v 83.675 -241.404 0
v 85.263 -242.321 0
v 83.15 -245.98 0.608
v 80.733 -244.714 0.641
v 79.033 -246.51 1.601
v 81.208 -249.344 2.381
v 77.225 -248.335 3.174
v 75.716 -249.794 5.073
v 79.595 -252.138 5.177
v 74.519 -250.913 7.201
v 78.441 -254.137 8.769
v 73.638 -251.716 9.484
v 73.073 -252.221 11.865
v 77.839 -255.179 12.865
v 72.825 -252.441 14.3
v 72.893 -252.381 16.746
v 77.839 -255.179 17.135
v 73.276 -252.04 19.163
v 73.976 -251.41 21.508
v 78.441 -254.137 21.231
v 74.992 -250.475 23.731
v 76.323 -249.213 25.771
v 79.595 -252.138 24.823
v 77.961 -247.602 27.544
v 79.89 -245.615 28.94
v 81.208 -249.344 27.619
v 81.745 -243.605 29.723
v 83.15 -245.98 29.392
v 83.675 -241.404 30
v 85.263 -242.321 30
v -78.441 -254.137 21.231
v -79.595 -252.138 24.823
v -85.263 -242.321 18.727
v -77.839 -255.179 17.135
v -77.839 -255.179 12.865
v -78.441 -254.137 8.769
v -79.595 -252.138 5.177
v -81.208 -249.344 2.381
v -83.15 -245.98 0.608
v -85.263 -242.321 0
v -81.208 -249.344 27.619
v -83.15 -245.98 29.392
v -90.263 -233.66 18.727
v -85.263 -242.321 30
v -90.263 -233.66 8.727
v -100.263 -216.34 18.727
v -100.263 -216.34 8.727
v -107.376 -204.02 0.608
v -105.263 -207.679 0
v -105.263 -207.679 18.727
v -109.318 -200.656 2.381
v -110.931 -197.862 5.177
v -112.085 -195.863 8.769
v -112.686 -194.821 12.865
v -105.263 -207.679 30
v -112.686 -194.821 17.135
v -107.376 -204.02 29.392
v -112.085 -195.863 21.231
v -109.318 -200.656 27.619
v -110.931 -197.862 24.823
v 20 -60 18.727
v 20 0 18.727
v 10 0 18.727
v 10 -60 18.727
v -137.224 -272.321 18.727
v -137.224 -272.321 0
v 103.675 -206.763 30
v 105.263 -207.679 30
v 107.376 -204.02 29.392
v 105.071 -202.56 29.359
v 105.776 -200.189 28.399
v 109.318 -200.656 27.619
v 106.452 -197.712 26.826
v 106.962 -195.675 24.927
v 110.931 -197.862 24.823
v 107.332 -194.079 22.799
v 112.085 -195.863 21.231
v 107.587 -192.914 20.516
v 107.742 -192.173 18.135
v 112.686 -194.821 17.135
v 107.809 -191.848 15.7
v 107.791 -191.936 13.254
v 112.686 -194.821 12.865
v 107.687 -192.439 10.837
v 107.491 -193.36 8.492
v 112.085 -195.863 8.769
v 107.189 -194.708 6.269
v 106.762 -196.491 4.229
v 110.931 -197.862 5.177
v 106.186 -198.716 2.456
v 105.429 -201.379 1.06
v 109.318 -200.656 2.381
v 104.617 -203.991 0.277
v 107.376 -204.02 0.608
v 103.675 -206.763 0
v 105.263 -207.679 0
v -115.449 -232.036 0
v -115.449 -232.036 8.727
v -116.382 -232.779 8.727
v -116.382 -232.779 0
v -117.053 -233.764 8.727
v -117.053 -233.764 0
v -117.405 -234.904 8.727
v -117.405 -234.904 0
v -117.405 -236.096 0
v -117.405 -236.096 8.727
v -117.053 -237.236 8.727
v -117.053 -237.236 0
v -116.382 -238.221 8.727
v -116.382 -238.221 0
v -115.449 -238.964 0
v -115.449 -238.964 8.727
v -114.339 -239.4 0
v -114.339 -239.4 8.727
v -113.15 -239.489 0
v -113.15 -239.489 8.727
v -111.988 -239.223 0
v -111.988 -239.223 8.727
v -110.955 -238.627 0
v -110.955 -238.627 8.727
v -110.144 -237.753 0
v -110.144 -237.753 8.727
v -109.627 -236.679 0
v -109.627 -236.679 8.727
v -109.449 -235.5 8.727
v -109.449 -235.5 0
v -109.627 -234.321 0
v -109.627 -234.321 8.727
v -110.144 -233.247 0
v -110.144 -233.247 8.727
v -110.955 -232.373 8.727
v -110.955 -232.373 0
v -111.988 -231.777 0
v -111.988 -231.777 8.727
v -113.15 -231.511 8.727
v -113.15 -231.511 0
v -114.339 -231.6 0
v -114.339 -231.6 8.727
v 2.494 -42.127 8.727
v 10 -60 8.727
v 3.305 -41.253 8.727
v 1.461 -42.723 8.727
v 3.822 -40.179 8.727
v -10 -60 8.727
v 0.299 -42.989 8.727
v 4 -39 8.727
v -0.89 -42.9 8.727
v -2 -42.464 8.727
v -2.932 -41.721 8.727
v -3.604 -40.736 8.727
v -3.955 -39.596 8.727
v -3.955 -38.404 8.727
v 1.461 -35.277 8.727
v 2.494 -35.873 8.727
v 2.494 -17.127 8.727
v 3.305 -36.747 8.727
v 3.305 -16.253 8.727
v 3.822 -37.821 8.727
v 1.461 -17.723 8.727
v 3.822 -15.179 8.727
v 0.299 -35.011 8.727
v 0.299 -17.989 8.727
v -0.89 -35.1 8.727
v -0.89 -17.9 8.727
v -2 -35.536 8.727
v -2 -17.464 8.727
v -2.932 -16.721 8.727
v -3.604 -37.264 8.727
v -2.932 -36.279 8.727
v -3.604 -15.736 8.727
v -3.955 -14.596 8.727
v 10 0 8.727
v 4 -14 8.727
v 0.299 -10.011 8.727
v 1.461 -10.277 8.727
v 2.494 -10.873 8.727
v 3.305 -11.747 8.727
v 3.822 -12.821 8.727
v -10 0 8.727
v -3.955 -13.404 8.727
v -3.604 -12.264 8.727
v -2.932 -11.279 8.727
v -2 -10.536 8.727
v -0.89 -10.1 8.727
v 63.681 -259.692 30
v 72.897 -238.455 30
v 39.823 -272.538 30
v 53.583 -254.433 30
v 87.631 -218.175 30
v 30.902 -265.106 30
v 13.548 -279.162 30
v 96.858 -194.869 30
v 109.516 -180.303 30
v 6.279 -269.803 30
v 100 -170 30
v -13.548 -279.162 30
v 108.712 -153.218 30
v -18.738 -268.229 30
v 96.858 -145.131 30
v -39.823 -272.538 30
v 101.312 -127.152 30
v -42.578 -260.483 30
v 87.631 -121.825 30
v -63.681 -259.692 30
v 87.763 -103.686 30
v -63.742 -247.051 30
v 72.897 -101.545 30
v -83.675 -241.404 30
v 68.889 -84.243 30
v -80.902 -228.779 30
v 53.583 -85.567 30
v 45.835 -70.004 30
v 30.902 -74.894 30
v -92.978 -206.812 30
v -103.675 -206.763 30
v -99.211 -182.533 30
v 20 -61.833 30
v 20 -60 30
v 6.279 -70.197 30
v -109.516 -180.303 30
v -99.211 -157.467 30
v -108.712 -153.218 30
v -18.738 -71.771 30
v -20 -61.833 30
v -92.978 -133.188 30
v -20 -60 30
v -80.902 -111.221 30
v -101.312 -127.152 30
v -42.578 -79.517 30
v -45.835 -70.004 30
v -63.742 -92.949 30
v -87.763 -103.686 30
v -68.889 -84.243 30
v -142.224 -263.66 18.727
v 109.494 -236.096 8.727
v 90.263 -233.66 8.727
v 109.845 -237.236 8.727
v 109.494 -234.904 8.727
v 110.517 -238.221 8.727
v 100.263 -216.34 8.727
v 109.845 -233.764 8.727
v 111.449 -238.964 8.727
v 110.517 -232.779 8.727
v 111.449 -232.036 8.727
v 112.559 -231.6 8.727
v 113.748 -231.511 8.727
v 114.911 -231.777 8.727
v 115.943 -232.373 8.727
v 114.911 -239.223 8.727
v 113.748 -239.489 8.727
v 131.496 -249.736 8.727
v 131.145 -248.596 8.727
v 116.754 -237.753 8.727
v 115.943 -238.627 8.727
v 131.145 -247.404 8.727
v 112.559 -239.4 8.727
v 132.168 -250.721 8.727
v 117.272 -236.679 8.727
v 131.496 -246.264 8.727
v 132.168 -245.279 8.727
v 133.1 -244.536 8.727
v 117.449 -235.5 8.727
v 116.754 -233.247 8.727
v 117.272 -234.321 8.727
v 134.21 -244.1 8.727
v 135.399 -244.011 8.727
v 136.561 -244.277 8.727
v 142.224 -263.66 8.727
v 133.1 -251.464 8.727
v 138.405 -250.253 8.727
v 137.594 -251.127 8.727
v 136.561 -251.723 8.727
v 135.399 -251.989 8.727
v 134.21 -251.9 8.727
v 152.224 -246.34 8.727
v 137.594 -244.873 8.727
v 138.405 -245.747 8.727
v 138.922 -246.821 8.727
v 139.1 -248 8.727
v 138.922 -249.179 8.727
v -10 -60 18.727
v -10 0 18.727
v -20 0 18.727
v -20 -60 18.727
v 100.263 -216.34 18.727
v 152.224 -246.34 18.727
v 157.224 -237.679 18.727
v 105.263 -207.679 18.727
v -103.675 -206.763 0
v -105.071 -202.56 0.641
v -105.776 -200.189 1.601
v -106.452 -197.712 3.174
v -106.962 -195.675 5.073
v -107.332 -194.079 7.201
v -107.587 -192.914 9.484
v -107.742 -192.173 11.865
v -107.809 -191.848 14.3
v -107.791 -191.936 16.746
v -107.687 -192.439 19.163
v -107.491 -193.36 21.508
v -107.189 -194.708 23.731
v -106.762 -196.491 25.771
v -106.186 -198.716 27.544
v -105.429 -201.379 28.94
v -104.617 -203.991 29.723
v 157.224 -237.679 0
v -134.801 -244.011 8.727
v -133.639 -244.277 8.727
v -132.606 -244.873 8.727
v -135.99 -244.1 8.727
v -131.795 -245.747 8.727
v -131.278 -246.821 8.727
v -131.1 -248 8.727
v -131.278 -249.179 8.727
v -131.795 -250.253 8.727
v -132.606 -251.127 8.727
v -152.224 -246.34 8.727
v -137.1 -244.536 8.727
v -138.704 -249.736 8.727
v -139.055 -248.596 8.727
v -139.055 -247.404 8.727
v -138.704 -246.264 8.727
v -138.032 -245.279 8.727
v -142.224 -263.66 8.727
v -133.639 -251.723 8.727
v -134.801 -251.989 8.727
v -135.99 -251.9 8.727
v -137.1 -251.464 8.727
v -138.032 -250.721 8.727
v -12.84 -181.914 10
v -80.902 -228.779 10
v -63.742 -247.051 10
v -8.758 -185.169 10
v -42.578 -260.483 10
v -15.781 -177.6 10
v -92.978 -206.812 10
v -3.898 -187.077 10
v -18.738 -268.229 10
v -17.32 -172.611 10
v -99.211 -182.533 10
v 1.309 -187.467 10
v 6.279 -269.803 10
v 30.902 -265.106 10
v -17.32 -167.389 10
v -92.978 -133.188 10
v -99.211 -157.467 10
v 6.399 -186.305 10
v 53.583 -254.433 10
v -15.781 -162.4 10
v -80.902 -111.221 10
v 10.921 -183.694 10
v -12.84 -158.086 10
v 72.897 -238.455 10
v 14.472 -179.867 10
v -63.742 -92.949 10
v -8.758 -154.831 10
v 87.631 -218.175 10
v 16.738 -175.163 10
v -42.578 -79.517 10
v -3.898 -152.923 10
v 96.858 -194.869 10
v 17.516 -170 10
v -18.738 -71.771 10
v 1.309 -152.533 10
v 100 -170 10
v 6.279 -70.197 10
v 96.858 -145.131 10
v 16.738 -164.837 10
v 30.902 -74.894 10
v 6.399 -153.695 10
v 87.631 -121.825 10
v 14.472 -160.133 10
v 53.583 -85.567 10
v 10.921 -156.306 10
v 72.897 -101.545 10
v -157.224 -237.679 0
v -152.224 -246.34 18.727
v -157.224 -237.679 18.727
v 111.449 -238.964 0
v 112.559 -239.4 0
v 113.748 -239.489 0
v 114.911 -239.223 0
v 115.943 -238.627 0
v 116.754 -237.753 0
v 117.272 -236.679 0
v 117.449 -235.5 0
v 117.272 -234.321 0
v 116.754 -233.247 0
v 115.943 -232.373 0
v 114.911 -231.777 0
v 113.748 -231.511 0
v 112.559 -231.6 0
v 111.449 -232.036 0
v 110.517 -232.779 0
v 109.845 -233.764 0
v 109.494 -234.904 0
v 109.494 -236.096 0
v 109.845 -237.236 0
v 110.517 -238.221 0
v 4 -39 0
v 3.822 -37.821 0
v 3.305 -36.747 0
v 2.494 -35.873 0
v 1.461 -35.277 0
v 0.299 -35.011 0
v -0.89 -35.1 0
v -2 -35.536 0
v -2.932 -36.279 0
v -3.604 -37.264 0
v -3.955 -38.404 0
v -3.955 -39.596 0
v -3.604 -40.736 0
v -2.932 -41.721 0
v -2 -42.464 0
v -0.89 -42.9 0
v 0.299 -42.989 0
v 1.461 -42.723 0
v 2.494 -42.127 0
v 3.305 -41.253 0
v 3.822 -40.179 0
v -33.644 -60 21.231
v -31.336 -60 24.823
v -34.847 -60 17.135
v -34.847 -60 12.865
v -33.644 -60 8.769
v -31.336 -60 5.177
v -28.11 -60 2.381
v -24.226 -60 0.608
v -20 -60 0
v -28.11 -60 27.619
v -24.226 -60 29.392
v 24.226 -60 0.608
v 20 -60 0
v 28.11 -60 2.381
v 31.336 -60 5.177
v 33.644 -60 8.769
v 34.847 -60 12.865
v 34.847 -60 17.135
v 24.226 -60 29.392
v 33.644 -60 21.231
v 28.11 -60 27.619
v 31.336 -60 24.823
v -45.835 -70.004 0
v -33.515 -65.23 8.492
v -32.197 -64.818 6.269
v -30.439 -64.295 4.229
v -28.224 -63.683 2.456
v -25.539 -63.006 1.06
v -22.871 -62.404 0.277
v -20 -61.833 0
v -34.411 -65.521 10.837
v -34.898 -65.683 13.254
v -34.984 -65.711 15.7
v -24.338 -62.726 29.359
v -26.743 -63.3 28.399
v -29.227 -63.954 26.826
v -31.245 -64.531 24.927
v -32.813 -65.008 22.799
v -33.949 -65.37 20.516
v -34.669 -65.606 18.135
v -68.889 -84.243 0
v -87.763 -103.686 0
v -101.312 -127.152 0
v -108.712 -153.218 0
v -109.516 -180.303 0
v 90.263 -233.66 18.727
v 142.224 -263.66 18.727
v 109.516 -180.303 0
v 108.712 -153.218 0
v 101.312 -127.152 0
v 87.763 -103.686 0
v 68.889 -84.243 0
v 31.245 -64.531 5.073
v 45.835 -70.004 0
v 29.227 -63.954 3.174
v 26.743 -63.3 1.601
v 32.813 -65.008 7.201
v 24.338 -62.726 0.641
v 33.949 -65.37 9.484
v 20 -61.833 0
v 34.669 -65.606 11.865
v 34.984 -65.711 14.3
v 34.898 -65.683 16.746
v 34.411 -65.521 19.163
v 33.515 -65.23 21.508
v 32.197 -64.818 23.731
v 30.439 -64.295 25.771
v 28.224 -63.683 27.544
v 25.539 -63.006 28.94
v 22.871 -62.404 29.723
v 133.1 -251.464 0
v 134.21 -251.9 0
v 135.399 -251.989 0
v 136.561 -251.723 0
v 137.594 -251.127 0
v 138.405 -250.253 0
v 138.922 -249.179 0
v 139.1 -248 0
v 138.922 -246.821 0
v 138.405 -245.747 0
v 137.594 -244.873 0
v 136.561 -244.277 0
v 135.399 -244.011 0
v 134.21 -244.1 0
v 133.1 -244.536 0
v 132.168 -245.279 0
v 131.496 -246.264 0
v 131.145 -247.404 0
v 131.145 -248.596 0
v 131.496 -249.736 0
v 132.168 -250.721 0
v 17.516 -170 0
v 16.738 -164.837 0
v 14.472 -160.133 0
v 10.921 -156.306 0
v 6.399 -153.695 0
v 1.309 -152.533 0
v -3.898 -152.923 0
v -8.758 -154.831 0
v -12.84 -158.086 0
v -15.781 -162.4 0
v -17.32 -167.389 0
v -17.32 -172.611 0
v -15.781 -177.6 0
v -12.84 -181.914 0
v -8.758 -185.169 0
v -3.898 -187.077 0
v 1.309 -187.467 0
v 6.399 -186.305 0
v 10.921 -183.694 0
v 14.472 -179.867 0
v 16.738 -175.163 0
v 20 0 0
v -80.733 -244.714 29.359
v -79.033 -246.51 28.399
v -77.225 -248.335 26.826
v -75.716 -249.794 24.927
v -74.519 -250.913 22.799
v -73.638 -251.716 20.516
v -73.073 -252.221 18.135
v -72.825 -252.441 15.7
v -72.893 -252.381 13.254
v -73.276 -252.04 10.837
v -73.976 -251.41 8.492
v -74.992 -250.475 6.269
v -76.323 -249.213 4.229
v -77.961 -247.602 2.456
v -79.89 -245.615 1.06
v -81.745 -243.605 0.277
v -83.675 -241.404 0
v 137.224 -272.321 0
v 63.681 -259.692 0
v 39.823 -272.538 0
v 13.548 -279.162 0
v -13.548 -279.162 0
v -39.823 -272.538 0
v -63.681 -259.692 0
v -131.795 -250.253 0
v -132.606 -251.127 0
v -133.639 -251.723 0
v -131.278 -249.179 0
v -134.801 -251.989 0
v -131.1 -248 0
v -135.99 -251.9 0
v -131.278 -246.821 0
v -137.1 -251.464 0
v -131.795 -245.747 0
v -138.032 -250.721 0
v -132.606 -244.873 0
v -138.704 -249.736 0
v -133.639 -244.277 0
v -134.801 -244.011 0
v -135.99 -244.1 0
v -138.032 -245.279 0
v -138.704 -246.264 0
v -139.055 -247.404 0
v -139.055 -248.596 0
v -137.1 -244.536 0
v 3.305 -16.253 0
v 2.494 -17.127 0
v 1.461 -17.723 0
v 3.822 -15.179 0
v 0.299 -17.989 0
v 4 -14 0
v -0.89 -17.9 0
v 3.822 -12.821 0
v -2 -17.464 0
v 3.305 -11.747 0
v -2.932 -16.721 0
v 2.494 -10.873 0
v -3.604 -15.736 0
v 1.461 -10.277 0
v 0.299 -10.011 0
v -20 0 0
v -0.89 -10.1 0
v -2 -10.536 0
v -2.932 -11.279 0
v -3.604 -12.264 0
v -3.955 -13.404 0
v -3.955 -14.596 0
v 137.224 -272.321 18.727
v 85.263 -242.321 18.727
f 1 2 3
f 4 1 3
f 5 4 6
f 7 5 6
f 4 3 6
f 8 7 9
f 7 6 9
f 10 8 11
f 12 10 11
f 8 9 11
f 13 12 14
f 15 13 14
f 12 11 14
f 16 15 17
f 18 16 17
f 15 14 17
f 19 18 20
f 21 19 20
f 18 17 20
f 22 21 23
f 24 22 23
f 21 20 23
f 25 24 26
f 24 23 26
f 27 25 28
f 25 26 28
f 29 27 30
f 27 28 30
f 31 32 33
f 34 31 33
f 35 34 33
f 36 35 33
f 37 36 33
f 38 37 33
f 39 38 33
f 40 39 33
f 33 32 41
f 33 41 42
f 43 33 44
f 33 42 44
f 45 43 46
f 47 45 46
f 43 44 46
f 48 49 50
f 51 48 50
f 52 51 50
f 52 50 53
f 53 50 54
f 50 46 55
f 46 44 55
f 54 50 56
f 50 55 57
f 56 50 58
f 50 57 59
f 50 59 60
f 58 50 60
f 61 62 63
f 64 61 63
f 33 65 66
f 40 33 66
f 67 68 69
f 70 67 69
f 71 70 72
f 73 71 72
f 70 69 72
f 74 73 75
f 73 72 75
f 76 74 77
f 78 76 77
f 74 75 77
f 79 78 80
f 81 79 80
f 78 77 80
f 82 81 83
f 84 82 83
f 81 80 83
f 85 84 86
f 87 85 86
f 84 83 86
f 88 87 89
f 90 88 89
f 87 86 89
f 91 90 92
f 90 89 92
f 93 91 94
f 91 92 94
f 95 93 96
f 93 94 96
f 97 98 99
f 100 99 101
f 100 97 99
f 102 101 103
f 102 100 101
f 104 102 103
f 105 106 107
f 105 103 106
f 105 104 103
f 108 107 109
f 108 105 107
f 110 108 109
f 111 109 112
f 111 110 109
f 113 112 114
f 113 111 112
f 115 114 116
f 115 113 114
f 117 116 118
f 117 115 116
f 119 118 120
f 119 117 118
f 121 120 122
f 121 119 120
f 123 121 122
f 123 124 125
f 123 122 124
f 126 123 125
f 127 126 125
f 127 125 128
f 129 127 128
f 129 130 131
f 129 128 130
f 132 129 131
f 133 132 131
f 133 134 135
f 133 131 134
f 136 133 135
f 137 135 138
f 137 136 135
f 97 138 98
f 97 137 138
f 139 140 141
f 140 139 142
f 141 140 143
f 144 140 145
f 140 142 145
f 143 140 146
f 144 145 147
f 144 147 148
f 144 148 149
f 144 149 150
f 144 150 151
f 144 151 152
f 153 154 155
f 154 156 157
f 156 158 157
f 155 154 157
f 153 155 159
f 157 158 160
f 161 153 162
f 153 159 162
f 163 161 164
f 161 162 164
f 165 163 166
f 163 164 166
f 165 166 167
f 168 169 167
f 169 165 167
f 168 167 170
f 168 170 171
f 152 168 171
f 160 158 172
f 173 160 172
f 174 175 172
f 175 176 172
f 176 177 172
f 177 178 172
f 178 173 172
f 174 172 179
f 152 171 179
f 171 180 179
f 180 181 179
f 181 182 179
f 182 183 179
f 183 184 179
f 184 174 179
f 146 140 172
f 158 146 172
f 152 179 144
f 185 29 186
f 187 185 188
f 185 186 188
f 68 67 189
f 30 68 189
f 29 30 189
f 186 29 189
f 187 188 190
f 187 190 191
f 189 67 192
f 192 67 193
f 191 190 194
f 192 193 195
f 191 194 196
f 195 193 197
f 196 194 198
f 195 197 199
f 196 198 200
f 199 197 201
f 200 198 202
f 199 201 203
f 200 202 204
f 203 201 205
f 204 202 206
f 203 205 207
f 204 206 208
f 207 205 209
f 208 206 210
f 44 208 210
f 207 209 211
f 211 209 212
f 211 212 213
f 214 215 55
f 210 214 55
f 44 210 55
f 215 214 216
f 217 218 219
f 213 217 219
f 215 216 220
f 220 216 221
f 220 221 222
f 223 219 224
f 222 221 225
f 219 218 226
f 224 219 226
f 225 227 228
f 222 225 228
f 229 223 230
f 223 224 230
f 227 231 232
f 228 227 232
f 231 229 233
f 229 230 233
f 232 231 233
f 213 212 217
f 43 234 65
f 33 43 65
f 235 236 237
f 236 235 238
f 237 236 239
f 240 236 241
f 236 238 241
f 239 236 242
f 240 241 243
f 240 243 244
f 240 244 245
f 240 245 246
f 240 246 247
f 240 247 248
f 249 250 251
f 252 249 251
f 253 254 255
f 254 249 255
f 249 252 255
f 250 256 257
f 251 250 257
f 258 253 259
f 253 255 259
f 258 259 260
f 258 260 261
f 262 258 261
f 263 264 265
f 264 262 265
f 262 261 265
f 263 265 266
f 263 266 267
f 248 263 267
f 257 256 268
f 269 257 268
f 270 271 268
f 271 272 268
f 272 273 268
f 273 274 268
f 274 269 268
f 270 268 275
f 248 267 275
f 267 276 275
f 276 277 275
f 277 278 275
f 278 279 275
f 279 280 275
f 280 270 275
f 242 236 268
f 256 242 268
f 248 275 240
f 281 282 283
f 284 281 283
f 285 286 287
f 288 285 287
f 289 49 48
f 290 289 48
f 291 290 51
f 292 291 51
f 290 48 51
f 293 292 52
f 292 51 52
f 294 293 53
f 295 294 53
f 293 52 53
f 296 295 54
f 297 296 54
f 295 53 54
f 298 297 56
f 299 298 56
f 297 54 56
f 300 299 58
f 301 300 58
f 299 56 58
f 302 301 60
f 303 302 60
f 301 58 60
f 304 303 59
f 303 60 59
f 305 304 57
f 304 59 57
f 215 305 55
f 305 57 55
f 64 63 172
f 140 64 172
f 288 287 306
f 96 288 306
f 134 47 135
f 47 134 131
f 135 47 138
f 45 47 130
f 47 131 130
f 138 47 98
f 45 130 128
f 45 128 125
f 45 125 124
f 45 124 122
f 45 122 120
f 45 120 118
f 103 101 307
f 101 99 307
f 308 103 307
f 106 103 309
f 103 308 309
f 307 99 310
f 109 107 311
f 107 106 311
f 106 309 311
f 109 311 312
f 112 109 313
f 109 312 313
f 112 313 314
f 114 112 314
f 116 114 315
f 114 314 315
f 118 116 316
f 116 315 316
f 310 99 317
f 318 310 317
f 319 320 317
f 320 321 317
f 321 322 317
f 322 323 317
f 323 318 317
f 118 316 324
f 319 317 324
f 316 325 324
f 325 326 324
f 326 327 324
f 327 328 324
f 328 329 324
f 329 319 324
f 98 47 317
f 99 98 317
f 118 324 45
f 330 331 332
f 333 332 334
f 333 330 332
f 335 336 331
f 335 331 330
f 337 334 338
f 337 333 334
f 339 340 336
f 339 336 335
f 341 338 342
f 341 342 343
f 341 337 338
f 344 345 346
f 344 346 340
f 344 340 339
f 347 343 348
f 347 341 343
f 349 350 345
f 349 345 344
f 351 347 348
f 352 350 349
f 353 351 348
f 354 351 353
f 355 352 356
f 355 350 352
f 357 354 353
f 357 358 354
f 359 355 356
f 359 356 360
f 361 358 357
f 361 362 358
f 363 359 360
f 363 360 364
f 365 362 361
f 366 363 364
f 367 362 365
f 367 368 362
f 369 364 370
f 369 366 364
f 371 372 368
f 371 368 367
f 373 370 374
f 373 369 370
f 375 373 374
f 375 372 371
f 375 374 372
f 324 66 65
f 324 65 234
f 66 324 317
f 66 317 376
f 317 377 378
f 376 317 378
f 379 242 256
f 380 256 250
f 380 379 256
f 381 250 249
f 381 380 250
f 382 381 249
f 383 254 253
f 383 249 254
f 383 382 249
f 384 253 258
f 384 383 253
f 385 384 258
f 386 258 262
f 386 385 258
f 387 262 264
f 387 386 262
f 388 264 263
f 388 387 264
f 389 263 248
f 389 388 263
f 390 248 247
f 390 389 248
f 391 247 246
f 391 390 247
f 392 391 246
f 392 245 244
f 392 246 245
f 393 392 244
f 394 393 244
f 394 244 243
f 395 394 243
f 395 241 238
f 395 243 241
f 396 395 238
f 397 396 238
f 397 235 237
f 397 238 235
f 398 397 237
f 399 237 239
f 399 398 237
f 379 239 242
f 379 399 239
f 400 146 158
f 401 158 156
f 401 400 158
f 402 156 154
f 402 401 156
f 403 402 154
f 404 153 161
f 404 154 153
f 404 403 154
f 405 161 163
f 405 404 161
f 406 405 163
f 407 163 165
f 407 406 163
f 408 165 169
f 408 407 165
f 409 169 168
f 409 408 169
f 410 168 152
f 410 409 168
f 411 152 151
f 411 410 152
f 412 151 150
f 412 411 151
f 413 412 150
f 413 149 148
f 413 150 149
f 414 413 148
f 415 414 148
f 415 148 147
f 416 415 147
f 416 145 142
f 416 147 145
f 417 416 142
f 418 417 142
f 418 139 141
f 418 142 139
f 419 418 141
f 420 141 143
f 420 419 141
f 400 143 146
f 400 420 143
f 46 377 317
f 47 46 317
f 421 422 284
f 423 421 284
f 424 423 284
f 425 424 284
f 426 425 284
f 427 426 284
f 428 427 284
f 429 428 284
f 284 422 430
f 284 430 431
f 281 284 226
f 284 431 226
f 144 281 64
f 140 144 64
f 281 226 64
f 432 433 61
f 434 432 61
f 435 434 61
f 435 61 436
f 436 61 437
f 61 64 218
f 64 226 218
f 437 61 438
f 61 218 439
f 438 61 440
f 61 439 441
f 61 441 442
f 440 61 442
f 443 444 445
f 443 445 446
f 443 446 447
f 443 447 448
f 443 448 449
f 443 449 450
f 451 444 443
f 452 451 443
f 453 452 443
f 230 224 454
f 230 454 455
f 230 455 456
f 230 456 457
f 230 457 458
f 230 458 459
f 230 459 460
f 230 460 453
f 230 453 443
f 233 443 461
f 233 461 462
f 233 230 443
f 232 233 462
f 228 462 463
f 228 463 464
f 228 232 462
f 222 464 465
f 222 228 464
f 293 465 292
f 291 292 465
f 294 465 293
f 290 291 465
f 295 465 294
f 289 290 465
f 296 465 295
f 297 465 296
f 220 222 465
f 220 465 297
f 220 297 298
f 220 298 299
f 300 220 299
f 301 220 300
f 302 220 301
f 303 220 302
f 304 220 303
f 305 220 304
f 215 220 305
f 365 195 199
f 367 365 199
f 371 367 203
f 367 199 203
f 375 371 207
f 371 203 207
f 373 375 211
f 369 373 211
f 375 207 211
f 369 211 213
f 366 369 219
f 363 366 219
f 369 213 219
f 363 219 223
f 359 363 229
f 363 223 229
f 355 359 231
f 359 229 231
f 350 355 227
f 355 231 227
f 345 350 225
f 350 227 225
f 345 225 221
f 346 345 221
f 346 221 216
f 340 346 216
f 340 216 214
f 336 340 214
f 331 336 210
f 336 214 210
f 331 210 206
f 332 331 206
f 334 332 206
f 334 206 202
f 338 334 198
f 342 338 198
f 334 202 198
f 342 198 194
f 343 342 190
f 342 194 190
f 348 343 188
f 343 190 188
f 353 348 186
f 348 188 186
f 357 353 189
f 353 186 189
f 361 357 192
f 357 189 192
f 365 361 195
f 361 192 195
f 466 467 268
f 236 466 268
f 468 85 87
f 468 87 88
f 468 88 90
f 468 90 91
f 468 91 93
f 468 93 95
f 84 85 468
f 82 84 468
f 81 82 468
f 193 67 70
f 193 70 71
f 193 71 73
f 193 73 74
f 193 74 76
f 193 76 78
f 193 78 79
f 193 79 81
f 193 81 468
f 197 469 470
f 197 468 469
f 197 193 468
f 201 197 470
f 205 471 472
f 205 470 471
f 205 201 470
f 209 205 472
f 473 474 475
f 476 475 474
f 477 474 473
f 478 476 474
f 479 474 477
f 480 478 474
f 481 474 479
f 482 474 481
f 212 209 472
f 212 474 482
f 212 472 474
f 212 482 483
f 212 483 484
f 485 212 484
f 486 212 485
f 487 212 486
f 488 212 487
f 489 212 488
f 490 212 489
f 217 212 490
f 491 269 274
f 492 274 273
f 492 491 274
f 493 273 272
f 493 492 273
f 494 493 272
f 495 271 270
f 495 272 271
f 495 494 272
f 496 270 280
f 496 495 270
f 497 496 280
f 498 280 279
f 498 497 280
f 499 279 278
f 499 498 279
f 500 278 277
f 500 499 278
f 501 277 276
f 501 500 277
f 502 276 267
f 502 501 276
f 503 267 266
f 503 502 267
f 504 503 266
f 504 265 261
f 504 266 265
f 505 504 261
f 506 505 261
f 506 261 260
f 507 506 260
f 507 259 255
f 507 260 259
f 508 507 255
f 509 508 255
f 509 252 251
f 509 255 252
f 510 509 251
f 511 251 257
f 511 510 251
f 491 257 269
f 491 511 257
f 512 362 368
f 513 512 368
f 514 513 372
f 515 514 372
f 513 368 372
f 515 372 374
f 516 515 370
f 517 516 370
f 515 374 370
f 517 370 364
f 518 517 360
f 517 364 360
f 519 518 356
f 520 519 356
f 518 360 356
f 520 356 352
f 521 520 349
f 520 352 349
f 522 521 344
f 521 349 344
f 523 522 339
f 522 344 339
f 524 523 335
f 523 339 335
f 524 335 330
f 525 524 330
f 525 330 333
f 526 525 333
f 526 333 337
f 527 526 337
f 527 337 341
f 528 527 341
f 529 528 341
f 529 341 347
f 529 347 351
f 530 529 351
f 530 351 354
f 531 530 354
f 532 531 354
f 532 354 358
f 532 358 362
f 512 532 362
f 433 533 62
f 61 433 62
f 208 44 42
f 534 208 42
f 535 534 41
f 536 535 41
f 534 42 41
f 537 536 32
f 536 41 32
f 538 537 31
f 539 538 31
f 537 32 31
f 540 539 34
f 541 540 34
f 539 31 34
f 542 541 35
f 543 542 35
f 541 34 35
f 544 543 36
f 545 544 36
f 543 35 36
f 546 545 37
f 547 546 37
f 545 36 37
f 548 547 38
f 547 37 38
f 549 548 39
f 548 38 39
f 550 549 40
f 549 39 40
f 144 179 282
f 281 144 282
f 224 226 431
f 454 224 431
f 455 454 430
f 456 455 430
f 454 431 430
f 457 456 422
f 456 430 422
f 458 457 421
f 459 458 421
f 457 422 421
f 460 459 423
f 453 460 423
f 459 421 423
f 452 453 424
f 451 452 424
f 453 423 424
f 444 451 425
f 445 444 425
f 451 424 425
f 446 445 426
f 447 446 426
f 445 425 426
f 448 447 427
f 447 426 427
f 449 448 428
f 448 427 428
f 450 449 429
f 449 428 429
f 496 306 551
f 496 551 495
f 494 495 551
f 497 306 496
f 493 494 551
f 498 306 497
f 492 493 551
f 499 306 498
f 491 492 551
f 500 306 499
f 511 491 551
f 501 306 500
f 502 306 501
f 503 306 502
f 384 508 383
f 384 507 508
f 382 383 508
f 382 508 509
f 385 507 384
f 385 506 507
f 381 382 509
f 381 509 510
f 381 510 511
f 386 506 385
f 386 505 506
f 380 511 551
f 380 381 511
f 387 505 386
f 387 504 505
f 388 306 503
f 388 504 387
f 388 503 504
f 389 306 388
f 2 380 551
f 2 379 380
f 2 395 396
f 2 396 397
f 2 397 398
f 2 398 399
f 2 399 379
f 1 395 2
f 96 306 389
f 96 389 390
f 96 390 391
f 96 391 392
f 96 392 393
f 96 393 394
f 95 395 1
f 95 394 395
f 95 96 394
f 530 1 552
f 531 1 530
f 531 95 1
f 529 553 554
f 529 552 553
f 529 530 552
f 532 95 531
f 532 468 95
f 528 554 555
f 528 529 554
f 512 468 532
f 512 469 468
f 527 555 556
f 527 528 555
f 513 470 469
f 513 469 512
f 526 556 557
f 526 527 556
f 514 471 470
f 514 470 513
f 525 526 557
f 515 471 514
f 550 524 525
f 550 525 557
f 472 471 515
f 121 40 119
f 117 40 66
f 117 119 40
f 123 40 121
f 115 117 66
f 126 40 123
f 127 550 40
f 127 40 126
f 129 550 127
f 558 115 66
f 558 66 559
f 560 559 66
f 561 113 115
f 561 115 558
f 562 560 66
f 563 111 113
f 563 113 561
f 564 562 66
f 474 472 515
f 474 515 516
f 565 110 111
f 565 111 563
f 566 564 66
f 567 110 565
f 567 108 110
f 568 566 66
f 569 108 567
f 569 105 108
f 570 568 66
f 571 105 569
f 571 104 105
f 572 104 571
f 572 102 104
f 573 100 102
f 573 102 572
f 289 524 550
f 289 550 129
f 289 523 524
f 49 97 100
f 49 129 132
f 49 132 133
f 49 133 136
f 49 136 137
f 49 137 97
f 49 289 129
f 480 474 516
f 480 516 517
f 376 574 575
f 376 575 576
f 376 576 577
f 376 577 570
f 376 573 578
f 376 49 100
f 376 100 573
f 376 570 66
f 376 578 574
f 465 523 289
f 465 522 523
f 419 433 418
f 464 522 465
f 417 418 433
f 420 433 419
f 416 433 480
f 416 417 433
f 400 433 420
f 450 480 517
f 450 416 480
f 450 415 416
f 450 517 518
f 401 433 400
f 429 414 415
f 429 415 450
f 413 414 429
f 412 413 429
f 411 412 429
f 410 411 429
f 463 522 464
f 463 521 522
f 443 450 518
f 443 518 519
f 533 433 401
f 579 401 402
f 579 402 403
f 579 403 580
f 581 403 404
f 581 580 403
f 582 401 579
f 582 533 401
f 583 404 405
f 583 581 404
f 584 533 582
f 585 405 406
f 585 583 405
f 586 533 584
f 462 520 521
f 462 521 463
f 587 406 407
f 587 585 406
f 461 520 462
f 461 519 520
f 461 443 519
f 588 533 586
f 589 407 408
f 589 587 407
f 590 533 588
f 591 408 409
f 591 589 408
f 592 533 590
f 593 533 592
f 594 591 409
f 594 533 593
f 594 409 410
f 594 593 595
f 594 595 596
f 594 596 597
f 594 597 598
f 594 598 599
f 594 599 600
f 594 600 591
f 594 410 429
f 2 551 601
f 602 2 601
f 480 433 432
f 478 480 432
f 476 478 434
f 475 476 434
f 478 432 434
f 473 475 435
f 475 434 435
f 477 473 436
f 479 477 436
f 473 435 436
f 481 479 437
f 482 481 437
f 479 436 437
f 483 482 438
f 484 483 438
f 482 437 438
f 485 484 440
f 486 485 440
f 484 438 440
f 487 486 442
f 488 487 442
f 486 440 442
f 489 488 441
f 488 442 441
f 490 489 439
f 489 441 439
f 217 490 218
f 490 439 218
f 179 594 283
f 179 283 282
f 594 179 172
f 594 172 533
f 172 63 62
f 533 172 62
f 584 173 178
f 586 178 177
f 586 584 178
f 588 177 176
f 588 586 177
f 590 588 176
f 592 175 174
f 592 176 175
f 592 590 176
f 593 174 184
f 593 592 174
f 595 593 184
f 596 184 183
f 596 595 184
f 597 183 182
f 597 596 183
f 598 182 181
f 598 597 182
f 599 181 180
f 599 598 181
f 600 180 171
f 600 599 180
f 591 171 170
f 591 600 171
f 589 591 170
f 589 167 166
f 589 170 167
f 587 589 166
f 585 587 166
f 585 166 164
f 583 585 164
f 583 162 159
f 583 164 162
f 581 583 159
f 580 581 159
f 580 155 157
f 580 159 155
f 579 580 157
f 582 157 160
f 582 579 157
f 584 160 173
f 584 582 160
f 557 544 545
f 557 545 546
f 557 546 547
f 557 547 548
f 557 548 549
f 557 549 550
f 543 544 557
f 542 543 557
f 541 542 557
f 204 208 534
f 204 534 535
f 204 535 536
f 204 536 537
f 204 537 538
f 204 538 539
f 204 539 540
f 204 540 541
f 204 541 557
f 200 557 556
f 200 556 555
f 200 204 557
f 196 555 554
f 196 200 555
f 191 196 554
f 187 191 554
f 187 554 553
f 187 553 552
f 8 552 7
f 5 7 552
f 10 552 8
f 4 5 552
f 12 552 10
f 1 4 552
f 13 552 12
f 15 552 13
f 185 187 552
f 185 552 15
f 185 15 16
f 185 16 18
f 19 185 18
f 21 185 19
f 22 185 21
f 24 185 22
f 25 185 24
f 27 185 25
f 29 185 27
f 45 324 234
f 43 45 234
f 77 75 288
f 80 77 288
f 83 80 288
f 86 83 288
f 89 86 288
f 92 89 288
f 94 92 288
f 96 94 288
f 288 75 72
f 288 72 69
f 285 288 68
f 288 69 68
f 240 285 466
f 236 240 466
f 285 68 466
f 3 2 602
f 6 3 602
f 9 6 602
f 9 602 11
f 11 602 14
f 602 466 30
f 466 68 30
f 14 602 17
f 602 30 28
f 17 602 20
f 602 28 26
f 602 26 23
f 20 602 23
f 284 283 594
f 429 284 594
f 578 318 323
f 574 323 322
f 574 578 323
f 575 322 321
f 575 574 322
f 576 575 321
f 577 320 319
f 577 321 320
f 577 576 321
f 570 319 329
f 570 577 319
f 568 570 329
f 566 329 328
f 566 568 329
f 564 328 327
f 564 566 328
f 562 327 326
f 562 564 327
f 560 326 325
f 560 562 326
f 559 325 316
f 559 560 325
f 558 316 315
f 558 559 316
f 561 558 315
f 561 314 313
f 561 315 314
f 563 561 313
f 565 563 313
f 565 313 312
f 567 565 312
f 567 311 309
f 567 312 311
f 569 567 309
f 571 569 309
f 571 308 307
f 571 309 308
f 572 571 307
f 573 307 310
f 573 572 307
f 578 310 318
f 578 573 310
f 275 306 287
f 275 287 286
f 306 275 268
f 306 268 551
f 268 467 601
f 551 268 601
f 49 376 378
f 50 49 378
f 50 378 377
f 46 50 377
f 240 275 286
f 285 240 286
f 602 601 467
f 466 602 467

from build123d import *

# Parameters (mm, degrees)
F1_DEPTH  = 60
F3_DEPTH  = 5
F4_R      = 4
F5_DEPTH  = 30.001
F6_DEPTH  = 10
F10_COUNT = 3
F10_ANGLE = 240
F8_W      = 110
F8_H      = 30
F12_R     = 100
F13_DEPTH = 20
F14_R     = 17.5157850189
F15_DEPTH = 10.0010001


with BuildPart() as f1:
    # F0 (on Front) → F1 (new body)
    with BuildSketch(Plane.XZ):
        Polygon((-20, 18.7272732889), (-20, 0), (20, 0), (20, 18.7272732889), (10, 18.7272732889), (10, 8.7272732889), (-10, 8.7272732889), (-10, 18.7272732889), align=None)
    extrude(amount=F1_DEPTH)

    # F2 (on face) → F3 (join)
    with BuildSketch(Plane.XZ.offset(60)):
        with BuildLine():
            ThreePointArc((-20, 30), (-35, 15), (-20, 0))
            Line((-20, 0), (20, 0))
            ThreePointArc((20, 0), (35, 15), (20, 30))
            Line((20, 30), (-20, 30))
        make_face()
    extrude(amount=F3_DEPTH)

    # F4 (on Top) → F5 (cut, through all)
    with BuildSketch(Plane.XY):
        with Locations((0, -39)):
            Circle(F4_R)
        with Locations((0, -14)):
            Circle(F4_R)
    extrude(amount=F5_DEPTH, mode=Mode.SUBTRACT)

    # F2 (on face) → F6 (join)
    with BuildSketch(Plane.XZ.offset(60)):
        with BuildLine():
            ThreePointArc((-20, 30), (-35, 15), (-20, 0))
            Line((-20, 0), (20, 0))
            ThreePointArc((20, 0), (35, 15), (20, 30))
            Line((20, 30), (-20, 30))
        make_face()
    extrude(amount=F6_DEPTH)


with BuildPart() as f10_1:
    # F10: instance of F1
    add(f1.part.rotate(Axis((0, -170, 15), (0, 0, 1)), 1 * F10_ANGLE / (F10_COUNT - 1)))


with BuildPart() as f10_2:
    # F10: instance of F1
    add(f1.part.rotate(Axis((0, -170, 15), (0, 0, 1)), 2 * F10_ANGLE / (F10_COUNT - 1)))


with BuildPart() as f1_1:
    add(f1.part)

    add(f10_1.part)  # F11 merges F10_1

    add(f10_2.part)  # F11 merges F10_2
    # F8 (on offset) → F11 (revolve)
    with BuildSketch(Plane.XZ.offset(170)):
        with Locations((55, 15)):
            Rectangle(F8_W, F8_H)
    revolve(axis=Axis((0, -170, 4.4428613037), (0, 0, 1)))

    # F12 (on face) → F13 (cut)
    with BuildSketch(Plane.XY.offset(30)):
        with Locations((0, -170)):
            Circle(F12_R)
    extrude(amount=-F13_DEPTH, mode=Mode.SUBTRACT)

    # F14 (on face) → F15 (cut, through all)
    with BuildSketch(Plane.XY.offset(10)):
        with Locations((0, -170)):
            Circle(F14_R)
    extrude(amount=-F15_DEPTH, mode=Mode.SUBTRACT)


solid = f1_1.part
